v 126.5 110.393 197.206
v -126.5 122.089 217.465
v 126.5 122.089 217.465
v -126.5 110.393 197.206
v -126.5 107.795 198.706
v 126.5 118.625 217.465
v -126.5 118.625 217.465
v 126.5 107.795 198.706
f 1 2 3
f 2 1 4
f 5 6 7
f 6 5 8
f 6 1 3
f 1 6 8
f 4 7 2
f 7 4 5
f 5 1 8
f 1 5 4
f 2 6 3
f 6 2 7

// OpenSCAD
// =============================================================================
// CONSOLE10 — Slant gap cap  (TALL variant: +3 mm vertical)
//
// Copy of Console10_slant_cap.scad, extended 3 mm taller VERTICALLY. The extra
// height is added at the BOTTOM edge (top stays trimmed flush with the top panel).
//
// A glue-on filler that closes the gap on the front 30-deg slant between the TOP
// panel and the TOP of the display faceplate (now mounted at the highest slant
// inserts). It follows the slant profile, is flush with the 3 mm display panel
// front, and extends 3 mm DOWN over the panel top (a lap that hides the seam).
// Glued to the top; not screwed.
//
// Local frame (= print orientation, lay it flat):
//   X = width,  Y = up the slant,  Z = thickness  (+Z = operator/front side).
// =============================================================================

// ---- shared geometry (kept equal to the module + faceplate) ----
slant_angle = 30;          // front slant, degrees from vertical
U           = 44.45;       // 1U
floor_t     = 6;           // bottom-panel slab thickness (slant seat reference)
front_gap   = U;           // 1U gap above the front-bottom corner
front_n_u   = 4;           // 4U slant mount capacity
top_margin  = 15;          // gap at the top of the slant above the highest mount
front_len   = front_gap + front_n_u * U + top_margin;   // 237.25 — slant length
back_h      = front_len * cos(slant_angle);             // 205.45 — cheek back-edge height
top_slab    = 6;                                        // top-panel slab thickness
top_top_z   = floor_t + back_h + top_slab;             // 217.45 — TOP of the top panel

// ---- display panel placement it caps (must match Console10_module.scad) ----
plate_h        = 3 * U;        // 133.35 — display faceplate height (3U)
panel_slant_up = (front_gap + (front_n_u - 1)*U + 38.10) - 127.00;  // 88.90 (highest-mount shift)
panel_top_s    = panel_slant_up + plate_h;     // 222.25 — panel top, along slant

// ---- cap ----
cap_w     = 253;           // full module width (flush with the cheek outer faces)
cap_t     = 3;             // thickness, flush with the display panel front
clr       = 2;             // base clearance above the panel top
extra_v   = 3;             // THIS VARIANT: extend 3 mm taller vertically, added at the bottom
cap_bot   = panel_top_s + clr - extra_v / cos(slant_angle);   // bottom edge drops 3 mm vertically
// run the plate up PAST the top of the top panel; the placement trims it flat there
cap_top_s = (top_top_z - floor_t) / cos(slant_angle) + 8;
cap_len   = cap_top_s - cap_bot;

$fn = 48;

echo(str("SLANT CAP  panel_top_s=", panel_top_s, "  cap_bot=", cap_bot,
         "  clearance_above_panel=", cap_bot - panel_top_s, " mm",
         "  top trimmed @ z=", top_top_z));

// raw plate in the local (print) frame, oversized at the top
module slant_cap() {
    translate([-cap_w/2, 0, 0]) cube([cap_w, cap_len, cap_t]);
}

// placed onto the slant (same tilt + seat as the faceplate), then TRIMMED flat at
// the top so the top face is horizontal + flush with the top of the top panel.
module slant_cap_on_slant() {
    difference() {
        translate([0, sin(slant_angle) * cap_bot, cos(slant_angle) * cap_bot])
            translate([0, 0, floor_t])
                rotate([90 - slant_angle, 0, 0])
                    slant_cap();
        translate([0, 0, top_top_z + 500]) cube([cap_w + 20, 2000, 1000], center = true);
    }
}

// Print orientation: undo the slant placement so the flat back lands on the bed
// (3 mm tall, with the angled trimmed top as an edge).
module slant_cap_for_print() {
    rotate([-(90 - slant_angle), 0, 0])
        translate([0, 0, -floor_t])
            translate([0, -sin(slant_angle) * cap_bot, -cos(slant_angle) * cap_bot])
                slant_cap_on_slant();
}

// Render: on-slant preview by default; -D print_mode=true for the flat print export.
print_mode = false;
if (print_mode) slant_cap_for_print();
else            slant_cap_on_slant();
